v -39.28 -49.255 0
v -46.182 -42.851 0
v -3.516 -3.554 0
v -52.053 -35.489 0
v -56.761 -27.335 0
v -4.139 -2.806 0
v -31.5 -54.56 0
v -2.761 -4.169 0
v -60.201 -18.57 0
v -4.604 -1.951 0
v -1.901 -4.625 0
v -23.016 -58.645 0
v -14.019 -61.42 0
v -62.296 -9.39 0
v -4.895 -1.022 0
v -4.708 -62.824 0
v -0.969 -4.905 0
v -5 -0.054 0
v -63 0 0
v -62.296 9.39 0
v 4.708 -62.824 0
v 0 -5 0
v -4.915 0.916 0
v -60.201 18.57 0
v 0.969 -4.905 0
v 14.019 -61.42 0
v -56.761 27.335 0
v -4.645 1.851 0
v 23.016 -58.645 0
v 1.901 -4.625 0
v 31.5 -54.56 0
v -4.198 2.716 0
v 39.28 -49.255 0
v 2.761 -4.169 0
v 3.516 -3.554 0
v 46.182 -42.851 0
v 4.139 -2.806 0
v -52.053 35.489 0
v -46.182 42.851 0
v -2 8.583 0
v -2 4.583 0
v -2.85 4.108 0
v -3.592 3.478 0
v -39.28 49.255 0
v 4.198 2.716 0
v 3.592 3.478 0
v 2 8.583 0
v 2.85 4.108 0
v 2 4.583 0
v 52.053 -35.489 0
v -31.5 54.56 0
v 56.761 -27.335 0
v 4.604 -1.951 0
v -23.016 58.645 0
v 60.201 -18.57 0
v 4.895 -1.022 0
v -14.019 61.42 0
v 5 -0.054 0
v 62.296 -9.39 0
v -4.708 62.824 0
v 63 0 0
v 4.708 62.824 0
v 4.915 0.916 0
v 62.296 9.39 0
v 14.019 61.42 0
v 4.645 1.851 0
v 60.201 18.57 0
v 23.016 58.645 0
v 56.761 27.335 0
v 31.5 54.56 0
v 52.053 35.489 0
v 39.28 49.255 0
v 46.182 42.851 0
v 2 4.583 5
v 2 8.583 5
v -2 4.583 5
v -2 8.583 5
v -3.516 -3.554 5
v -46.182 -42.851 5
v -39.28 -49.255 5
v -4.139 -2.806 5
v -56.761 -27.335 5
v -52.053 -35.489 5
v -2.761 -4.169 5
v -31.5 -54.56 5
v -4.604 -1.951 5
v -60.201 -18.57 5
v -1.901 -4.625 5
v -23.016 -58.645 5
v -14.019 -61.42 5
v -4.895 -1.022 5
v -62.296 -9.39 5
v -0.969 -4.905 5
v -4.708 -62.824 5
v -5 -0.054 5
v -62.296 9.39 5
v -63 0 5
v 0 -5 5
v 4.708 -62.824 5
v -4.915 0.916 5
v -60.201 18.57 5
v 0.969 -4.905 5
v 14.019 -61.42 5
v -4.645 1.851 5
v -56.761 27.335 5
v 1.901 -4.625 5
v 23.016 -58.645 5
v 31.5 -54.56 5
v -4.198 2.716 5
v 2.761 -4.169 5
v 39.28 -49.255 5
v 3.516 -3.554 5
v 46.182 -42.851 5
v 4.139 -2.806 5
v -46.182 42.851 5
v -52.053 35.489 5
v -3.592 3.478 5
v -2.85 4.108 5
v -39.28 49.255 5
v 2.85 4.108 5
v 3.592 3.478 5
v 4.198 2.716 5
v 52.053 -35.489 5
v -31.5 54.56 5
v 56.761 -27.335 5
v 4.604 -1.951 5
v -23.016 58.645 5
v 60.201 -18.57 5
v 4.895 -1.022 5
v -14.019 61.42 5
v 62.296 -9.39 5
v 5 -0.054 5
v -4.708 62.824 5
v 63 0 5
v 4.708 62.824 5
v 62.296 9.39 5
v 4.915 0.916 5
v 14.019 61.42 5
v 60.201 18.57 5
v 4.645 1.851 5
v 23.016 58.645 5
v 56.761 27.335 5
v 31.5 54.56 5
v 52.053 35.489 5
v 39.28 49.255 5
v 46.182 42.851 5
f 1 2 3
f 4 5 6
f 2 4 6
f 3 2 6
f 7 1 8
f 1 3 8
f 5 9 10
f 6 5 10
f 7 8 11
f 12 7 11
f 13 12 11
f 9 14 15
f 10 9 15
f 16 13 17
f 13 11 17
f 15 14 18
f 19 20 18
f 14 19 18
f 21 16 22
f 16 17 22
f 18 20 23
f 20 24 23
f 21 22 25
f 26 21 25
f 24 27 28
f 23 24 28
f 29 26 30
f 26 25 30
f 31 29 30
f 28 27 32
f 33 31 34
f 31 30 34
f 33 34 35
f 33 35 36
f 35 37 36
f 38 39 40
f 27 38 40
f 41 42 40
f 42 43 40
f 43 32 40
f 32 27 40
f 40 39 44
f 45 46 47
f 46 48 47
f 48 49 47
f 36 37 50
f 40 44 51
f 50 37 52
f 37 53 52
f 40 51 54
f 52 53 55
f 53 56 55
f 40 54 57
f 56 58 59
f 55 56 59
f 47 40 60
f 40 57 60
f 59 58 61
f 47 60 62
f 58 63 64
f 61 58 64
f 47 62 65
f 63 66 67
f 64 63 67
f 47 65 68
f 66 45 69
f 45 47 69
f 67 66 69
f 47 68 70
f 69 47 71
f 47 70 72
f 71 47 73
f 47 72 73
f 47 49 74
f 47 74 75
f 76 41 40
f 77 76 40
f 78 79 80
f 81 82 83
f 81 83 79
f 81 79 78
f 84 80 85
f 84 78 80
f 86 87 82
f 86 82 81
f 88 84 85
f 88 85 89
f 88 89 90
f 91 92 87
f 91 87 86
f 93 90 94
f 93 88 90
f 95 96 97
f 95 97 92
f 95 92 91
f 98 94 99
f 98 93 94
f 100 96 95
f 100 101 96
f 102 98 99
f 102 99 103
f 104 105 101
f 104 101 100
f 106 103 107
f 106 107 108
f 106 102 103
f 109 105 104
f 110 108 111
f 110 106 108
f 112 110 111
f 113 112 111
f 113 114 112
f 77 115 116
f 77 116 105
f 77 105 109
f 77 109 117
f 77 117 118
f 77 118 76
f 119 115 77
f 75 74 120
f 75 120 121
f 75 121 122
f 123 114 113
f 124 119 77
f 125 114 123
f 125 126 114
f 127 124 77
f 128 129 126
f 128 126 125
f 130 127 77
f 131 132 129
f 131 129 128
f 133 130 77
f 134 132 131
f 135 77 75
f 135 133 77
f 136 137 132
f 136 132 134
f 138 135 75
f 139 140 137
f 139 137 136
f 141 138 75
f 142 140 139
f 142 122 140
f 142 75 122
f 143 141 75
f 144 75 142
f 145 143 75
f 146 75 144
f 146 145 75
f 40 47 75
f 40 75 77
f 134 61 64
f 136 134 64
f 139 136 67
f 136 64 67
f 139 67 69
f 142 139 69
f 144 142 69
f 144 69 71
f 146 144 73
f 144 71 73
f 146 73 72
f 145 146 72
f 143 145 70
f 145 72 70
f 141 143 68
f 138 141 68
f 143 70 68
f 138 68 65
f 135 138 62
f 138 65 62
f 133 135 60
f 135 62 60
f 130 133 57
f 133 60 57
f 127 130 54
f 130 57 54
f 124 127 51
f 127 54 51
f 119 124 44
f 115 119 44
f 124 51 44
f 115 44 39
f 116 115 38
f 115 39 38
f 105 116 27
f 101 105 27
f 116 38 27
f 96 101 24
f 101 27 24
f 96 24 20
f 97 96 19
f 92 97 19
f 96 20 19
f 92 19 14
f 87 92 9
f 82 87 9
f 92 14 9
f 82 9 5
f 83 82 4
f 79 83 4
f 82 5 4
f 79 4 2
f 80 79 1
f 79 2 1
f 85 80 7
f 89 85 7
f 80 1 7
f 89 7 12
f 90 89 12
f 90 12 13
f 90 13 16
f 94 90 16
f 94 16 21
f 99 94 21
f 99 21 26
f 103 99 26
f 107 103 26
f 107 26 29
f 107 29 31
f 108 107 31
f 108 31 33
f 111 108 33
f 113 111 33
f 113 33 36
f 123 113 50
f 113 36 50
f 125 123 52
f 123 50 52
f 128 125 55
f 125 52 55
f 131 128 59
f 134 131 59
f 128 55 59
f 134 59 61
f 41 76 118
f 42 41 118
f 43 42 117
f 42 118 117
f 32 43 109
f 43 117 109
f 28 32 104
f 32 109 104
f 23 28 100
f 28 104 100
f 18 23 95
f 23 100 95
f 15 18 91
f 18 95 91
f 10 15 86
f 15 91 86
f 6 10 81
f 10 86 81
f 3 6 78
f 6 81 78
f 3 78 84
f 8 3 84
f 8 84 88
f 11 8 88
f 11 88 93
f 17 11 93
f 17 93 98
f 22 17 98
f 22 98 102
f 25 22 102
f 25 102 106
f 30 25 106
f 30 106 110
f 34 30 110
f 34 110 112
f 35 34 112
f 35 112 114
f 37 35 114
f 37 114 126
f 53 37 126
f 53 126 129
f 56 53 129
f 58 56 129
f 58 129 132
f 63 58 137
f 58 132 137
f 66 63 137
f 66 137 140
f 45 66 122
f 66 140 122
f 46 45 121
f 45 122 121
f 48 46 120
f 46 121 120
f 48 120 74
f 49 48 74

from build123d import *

# Parameters (mm, degrees)
IZIM1_R                     = 63
Y_KSEKLIK_EKSTR_ZYON1_DEPTH = 5
IZIM2_R                     = 5
KES_EKSTR_ZYON1_DEPTH       = 10
IZIM3_W                     = 4
IZIM3_H                     = 4
KES_EKSTR_ZYON2_DEPTH       = 8


with BuildPart() as part:
    # Çizim1 → Yükseklik-Ekstrüzyon1 (new body)
    with BuildSketch(Plane.XY):
        Circle(IZIM1_R)
    extrude(amount=Y_KSEKLIK_EKSTR_ZYON1_DEPTH)

    # Çizim2 → Kes-Ekstrüzyon1 (cut)
    with BuildSketch(Plane.XY.offset(5)):
        Circle(IZIM2_R)
    extrude(amount=-KES_EKSTR_ZYON1_DEPTH, mode=Mode.SUBTRACT)

    # Çizim3 → Kes-Ekstrüzyon2 (cut)
    with BuildSketch(Plane(origin=(0, 0, 0), x_dir=(-1, 0, 0), z_dir=(0, 0, -1))):
        with Locations((0, 6.582575695)):
            Rectangle(IZIM3_W, IZIM3_H)
    extrude(amount=-KES_EKSTR_ZYON2_DEPTH, mode=Mode.SUBTRACT)


solid = part.part
